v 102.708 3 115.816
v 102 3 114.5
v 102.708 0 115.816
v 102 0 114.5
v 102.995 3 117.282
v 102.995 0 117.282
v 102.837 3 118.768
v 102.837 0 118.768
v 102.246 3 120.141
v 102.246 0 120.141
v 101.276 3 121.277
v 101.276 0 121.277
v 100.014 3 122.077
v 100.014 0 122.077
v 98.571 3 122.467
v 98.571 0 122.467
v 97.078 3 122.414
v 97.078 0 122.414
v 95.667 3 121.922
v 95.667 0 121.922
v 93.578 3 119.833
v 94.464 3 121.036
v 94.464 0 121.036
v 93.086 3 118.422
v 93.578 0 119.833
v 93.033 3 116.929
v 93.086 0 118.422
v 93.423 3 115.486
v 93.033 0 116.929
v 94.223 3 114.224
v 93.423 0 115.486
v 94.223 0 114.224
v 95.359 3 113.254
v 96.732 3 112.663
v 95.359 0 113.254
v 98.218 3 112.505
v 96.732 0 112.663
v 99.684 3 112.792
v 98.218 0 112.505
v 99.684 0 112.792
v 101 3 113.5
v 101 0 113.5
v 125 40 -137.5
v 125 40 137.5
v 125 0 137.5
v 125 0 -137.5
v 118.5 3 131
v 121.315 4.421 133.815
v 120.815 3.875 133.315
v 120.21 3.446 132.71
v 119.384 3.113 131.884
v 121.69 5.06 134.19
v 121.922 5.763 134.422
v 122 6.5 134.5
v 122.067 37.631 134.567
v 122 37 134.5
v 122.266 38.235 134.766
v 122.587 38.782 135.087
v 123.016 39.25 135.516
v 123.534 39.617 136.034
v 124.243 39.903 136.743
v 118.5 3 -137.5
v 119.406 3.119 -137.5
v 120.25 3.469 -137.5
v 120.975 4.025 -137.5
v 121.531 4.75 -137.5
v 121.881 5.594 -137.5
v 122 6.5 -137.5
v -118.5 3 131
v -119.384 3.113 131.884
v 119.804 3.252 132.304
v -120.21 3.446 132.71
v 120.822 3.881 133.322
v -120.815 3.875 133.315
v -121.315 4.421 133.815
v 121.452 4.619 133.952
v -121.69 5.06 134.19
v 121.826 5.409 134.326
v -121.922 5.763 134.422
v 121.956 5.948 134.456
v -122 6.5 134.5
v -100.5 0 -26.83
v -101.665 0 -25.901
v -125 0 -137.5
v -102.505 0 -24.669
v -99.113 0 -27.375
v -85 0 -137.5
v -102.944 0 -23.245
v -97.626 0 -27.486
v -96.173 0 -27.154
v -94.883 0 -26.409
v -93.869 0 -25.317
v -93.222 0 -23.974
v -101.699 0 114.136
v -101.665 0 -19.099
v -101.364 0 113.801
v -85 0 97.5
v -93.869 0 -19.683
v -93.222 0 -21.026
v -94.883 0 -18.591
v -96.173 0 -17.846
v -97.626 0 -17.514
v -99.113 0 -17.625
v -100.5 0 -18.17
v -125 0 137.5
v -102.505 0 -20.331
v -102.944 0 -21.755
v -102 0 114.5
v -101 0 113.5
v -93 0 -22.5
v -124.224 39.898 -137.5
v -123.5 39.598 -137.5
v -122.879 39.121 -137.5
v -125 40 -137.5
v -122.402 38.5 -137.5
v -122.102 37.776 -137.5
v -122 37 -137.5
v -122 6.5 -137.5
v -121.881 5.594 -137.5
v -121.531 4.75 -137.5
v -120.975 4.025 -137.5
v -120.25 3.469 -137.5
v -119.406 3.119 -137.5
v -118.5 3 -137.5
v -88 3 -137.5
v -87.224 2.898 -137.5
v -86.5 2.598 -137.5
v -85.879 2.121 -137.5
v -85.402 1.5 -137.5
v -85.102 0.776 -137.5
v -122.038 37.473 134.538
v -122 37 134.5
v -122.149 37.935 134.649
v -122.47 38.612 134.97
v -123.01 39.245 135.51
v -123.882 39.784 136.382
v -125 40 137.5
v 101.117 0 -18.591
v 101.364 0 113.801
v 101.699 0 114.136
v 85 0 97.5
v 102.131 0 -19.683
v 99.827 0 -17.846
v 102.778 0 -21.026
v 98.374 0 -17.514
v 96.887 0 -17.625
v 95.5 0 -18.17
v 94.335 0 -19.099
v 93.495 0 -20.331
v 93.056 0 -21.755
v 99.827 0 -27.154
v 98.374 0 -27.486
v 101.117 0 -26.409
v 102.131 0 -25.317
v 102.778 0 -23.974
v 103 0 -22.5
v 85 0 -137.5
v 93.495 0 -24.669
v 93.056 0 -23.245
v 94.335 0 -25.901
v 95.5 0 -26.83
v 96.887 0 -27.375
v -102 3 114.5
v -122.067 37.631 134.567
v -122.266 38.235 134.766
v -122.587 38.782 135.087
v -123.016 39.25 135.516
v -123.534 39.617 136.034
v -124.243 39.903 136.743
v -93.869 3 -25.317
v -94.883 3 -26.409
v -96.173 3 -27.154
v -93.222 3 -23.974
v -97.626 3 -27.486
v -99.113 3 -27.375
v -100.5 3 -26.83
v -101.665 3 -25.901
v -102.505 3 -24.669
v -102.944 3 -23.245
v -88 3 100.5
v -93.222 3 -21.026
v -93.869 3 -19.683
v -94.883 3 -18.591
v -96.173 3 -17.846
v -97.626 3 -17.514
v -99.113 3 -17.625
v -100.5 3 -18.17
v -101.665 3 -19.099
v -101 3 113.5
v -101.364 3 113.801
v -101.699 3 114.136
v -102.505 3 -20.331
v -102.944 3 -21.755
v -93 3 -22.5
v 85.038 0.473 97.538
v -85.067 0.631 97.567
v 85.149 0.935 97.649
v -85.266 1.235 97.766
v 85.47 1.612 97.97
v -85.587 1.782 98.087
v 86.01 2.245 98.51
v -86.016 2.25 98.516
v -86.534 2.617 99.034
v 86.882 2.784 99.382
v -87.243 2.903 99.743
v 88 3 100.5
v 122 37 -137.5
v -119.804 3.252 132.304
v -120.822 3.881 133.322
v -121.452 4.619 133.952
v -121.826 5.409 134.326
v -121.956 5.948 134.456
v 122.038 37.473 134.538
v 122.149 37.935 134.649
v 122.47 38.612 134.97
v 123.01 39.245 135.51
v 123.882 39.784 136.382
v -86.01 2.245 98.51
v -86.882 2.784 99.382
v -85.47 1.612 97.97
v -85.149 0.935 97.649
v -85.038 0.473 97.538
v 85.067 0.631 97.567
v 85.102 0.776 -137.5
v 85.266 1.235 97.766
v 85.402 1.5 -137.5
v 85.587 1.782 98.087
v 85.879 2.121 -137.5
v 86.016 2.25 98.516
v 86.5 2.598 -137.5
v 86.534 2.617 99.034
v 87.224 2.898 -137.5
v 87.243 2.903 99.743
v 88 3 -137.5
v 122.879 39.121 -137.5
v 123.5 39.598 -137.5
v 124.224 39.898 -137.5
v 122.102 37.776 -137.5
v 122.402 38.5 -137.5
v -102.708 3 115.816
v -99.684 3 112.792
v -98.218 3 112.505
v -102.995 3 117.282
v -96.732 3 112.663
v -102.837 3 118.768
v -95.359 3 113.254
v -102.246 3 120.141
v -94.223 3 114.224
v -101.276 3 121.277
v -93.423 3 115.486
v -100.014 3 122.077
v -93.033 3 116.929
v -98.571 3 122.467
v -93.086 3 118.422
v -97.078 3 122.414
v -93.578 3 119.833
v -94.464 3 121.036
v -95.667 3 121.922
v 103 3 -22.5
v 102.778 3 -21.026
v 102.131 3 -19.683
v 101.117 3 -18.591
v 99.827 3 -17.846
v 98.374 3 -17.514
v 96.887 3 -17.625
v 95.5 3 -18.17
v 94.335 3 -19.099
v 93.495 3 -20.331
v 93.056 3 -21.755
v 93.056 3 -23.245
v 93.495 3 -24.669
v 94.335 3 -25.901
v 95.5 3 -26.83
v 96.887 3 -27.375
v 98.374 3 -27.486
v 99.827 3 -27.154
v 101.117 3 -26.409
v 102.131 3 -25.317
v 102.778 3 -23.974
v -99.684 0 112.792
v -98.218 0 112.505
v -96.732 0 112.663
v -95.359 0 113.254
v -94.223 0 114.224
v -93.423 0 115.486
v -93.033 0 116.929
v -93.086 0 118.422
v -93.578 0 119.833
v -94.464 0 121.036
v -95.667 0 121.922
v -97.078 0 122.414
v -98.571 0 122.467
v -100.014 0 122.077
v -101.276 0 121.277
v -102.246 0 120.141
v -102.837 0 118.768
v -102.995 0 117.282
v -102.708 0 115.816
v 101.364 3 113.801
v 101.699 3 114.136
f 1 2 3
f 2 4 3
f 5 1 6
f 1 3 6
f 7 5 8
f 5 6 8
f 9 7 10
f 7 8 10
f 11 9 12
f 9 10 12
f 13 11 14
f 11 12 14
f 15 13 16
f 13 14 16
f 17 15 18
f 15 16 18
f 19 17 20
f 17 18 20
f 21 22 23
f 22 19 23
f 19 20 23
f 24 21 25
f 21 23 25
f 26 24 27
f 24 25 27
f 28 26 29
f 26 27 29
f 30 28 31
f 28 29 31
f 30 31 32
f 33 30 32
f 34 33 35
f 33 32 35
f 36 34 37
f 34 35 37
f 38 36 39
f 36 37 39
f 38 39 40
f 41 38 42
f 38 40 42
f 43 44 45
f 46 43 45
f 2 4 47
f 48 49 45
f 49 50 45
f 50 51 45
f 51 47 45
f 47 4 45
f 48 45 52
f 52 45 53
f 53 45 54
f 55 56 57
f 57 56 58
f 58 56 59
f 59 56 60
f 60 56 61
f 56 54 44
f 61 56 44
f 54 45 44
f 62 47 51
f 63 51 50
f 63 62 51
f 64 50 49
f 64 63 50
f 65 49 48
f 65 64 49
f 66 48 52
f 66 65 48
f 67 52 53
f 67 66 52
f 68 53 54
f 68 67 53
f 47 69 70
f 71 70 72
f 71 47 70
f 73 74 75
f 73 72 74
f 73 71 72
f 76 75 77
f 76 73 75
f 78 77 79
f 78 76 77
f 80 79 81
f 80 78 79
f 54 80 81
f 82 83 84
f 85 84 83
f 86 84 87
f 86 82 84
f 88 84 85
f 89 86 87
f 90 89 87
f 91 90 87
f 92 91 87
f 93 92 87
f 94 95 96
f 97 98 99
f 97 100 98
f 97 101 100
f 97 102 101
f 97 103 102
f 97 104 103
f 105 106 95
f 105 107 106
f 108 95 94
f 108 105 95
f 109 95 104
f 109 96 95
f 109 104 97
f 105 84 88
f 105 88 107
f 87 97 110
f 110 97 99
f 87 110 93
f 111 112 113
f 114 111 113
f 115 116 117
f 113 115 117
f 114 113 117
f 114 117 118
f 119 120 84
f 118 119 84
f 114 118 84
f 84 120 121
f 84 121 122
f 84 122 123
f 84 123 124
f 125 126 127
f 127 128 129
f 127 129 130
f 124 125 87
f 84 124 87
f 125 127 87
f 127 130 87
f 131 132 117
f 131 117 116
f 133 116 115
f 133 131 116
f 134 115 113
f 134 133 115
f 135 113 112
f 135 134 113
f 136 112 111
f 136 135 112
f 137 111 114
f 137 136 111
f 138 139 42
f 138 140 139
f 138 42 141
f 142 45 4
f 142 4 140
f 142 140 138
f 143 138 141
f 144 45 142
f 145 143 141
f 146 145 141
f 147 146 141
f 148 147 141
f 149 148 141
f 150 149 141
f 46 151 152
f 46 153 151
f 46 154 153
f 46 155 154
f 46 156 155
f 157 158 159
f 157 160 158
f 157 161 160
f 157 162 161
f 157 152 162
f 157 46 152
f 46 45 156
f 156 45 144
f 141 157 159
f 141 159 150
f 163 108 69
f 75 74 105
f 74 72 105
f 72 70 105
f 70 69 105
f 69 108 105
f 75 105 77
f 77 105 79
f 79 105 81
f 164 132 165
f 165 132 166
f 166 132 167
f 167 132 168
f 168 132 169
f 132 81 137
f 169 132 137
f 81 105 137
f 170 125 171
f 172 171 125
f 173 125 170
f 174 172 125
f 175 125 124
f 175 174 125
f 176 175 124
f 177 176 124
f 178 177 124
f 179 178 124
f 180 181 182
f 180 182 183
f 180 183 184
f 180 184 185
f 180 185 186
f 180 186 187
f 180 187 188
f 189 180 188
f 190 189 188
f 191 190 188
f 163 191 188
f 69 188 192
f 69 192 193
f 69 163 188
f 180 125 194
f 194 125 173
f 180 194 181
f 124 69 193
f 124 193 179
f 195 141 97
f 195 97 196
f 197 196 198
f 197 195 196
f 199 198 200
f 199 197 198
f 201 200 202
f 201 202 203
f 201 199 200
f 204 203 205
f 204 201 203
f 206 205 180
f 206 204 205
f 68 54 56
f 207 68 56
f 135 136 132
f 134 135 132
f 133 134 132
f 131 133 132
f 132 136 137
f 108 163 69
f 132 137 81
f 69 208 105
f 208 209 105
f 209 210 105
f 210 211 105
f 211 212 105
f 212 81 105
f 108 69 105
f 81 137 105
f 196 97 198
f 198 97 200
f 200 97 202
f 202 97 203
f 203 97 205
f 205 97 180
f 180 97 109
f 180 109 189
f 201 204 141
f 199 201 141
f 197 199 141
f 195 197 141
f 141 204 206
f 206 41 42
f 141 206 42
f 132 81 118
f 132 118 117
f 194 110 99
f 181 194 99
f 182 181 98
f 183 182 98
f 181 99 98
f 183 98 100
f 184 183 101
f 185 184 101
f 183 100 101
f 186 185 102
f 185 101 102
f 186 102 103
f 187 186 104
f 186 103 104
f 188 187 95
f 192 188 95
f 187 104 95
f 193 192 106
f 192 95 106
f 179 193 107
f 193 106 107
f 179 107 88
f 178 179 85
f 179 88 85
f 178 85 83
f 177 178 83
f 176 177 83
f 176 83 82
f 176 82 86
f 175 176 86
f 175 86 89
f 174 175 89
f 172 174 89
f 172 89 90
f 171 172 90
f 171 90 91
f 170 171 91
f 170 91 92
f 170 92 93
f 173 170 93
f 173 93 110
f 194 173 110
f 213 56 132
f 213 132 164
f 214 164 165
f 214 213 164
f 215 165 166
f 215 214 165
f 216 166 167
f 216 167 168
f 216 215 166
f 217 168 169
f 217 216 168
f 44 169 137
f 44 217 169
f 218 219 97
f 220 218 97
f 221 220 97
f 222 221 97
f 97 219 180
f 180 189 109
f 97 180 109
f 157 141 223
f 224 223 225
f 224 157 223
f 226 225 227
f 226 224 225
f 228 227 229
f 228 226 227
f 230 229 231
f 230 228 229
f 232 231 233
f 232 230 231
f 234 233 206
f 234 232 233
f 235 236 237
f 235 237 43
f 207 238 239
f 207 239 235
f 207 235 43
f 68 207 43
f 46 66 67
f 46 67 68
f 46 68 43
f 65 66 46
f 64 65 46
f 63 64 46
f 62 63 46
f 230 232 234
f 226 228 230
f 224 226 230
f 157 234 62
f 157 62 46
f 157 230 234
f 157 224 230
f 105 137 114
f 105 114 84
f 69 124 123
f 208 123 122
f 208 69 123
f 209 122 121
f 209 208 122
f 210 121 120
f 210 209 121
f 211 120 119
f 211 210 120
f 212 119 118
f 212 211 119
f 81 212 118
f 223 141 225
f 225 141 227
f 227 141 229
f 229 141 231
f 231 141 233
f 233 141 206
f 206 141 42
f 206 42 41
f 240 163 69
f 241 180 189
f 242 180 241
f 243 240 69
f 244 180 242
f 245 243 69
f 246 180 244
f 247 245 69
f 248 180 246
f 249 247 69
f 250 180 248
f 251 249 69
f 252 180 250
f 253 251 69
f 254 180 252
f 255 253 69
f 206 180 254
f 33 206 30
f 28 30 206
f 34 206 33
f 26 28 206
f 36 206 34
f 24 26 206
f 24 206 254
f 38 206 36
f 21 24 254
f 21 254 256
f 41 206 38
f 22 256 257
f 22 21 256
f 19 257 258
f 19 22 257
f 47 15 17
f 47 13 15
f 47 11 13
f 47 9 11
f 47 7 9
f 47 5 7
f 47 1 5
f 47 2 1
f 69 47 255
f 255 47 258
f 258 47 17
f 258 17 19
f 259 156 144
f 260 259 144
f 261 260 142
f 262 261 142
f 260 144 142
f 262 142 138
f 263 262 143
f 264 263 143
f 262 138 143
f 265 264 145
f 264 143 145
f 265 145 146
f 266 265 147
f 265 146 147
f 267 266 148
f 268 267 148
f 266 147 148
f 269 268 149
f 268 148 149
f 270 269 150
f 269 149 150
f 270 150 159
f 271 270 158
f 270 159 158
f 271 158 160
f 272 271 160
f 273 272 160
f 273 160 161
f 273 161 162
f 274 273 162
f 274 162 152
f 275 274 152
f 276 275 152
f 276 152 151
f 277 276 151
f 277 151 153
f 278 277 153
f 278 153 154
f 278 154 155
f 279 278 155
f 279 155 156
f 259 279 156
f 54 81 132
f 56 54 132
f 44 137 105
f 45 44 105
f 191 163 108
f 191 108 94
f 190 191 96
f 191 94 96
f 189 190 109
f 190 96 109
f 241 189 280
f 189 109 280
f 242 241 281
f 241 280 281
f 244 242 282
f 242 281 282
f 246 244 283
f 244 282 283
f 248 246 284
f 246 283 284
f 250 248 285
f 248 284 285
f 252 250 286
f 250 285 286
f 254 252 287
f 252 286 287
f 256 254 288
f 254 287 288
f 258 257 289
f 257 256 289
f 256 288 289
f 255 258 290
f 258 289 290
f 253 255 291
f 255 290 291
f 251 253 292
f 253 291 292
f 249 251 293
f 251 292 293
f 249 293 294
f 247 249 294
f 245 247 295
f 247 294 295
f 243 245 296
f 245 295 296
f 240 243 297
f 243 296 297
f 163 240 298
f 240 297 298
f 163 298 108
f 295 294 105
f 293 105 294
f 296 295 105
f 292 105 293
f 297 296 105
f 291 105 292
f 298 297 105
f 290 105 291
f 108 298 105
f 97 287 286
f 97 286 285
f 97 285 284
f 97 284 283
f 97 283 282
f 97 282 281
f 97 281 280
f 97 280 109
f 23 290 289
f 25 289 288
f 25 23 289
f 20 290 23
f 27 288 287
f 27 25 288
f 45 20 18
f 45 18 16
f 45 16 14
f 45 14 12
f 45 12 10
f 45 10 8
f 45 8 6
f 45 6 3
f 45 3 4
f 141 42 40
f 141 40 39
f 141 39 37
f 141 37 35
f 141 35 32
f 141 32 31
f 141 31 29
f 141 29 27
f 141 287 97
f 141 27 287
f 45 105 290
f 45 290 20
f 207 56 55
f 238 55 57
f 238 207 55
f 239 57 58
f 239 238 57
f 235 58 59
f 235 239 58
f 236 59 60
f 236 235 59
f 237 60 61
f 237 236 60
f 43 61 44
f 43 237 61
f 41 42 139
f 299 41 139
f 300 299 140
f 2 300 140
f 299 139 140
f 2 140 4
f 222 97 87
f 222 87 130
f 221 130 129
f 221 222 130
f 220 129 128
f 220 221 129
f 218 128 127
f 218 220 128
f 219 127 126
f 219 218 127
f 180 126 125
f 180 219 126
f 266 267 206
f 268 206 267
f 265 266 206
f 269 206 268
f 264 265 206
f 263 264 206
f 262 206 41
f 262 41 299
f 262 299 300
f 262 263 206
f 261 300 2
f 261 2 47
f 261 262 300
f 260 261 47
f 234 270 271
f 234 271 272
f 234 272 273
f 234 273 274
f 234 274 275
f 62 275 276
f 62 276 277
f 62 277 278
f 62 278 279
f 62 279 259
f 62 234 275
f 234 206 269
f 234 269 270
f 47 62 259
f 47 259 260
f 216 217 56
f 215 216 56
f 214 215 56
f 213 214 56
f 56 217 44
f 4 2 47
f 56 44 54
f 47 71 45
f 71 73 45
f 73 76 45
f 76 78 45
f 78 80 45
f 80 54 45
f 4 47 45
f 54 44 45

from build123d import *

# Parameters (mm, degrees)
IRON_V40X40X3_1_DEPTH        = 332.568542495
IRON_V40X40X3_1_2_DEPTH      = 365.13708499
IRON_V40X40X3_1_3_DEPTH      = 275
IRON_V40X40X3_1_3_DEPTH_BACK = 57.568542495
CUT_EXTRUDE1_START           = 10
SKETCH12_R                   = 5
CUT_EXTRUDE1_DEPTH           = 20


with BuildPart() as part:
    # Sketch11 on segment 1 (carried to segment 1) → Iron V40X40X3(1) (new body)
    with BuildSketch(Plane(origin=(125, 0, -137.5), x_dir=(0, 1, 0), z_dir=(0, 0, 1))):
        with BuildLine():
            Line((0, 0), (0, 40))
            ThreePointArc((0, 40), (2.121320344, 39.121320344), (3, 37))
            Line((3, 37), (3, 6.5))
            ThreePointArc((3, 6.5), (4.025126266, 4.025126266), (6.5, 3))
            Line((6.5, 3), (37, 3))
            ThreePointArc((37, 3), (39.121320344, 2.121320344), (40, 0))
            Line((40, 0), (0, 0))
        make_face()
    extrude(amount=IRON_V40X40X3_1_DEPTH)

    # Iron V40X40X3(1) mitre 1
    split(bisect_by=Plane(origin=(125, 0, 137.5), x_dir=(0, 1, 0), z_dir=(0.707106781, 0, -0.707106781)), keep=Keep.TOP)


with BuildPart() as body_2:
    # Sketch11 on segment 2 (carried to segment 2) → Iron V40X40X3_1 2 (new body)
    with BuildSketch(Plane(origin=(182.568542495, 0, 137.5), x_dir=(0, 1, 0), z_dir=(-1, 0, 0))):
        with BuildLine():
            Line((0, 0), (0, 40))
            ThreePointArc((0, 40), (2.121320344, 39.121320344), (3, 37))
            Line((3, 37), (3, 6.5))
            ThreePointArc((3, 6.5), (4.025126266, 4.025126266), (6.5, 3))
            Line((6.5, 3), (37, 3))
            ThreePointArc((37, 3), (39.121320344, 2.121320344), (40, 0))
            Line((40, 0), (0, 0))
        make_face()
    extrude(amount=IRON_V40X40X3_1_2_DEPTH)

    # Iron V40X40X3_1 2 mitre 1
    split(bisect_by=Plane(origin=(125, 0, 137.5), x_dir=(0, -1, 0), z_dir=(-0.707106781, 0, 0.707106781)), keep=Keep.TOP)

    # Iron V40X40X3_1 2 mitre 2
    split(bisect_by=Plane(origin=(-125, 0, 137.5), x_dir=(0, 1, 0), z_dir=(0.707106781, 0, 0.707106781)), keep=Keep.TOP)


with BuildPart() as body_3:
    # Sketch11 → Iron V40X40X3_1 3 (new, two sides: drawn at the far end of the back side and taken through both)
    with BuildSketch(Plane(origin=(-125, 0, 137.5), x_dir=(0, 1, 0), z_dir=(0, 0, -1)).offset(-IRON_V40X40X3_1_3_DEPTH_BACK)):
        with BuildLine():
            Line((0, 0), (0, 40))
            ThreePointArc((0, 40), (2.121320344, 39.121320344), (3, 37))
            Line((3, 37), (3, 6.5))
            ThreePointArc((3, 6.5), (4.025126266, 4.025126266), (6.5, 3))
            Line((6.5, 3), (37, 3))
            ThreePointArc((37, 3), (39.121320344, 2.121320344), (40, 0))
            Line((40, 0), (0, 0))
        make_face()
    extrude(amount=IRON_V40X40X3_1_3_DEPTH + IRON_V40X40X3_1_3_DEPTH_BACK)

    # Iron V40X40X3_1 3 mitre 1
    split(bisect_by=Plane(origin=(-125, 0, 137.5), x_dir=(0, -1, 0), z_dir=(-0.707106781, 0, -0.707106781)), keep=Keep.TOP)


with BuildPart() as cut_extrude1_tool:
    # Sketch12 → Cut-Extrude1 (new body)
    with BuildSketch(Plane.XZ.offset(CUT_EXTRUDE1_START)):
        with Locations((-98, 117.5)):
            Circle(SKETCH12_R)
        with Locations((98, 117.5)):
            Circle(SKETCH12_R)
        with Locations((98, -22.5)):
            Circle(SKETCH12_R)
        with Locations((-98, -22.5)):
            Circle(SKETCH12_R)
    extrude(amount=-CUT_EXTRUDE1_DEPTH)


with BuildPart() as part_1:
    add(part.part)

    # Cut-Extrude1: cut by cut_extrude1_tool
    add(cut_extrude1_tool.part, mode=Mode.SUBTRACT)


with BuildPart() as body_2_1:
    add(body_2.part)

    # Cut-Extrude1: cut by cut_extrude1_tool
    add(cut_extrude1_tool.part, mode=Mode.SUBTRACT)


with BuildPart() as body_3_1:
    add(body_3.part)

    # Cut-Extrude1: cut by cut_extrude1_tool
    add(cut_extrude1_tool.part, mode=Mode.SUBTRACT)


solid = Compound([part_1.part, body_2_1.part, body_3_1.part])
